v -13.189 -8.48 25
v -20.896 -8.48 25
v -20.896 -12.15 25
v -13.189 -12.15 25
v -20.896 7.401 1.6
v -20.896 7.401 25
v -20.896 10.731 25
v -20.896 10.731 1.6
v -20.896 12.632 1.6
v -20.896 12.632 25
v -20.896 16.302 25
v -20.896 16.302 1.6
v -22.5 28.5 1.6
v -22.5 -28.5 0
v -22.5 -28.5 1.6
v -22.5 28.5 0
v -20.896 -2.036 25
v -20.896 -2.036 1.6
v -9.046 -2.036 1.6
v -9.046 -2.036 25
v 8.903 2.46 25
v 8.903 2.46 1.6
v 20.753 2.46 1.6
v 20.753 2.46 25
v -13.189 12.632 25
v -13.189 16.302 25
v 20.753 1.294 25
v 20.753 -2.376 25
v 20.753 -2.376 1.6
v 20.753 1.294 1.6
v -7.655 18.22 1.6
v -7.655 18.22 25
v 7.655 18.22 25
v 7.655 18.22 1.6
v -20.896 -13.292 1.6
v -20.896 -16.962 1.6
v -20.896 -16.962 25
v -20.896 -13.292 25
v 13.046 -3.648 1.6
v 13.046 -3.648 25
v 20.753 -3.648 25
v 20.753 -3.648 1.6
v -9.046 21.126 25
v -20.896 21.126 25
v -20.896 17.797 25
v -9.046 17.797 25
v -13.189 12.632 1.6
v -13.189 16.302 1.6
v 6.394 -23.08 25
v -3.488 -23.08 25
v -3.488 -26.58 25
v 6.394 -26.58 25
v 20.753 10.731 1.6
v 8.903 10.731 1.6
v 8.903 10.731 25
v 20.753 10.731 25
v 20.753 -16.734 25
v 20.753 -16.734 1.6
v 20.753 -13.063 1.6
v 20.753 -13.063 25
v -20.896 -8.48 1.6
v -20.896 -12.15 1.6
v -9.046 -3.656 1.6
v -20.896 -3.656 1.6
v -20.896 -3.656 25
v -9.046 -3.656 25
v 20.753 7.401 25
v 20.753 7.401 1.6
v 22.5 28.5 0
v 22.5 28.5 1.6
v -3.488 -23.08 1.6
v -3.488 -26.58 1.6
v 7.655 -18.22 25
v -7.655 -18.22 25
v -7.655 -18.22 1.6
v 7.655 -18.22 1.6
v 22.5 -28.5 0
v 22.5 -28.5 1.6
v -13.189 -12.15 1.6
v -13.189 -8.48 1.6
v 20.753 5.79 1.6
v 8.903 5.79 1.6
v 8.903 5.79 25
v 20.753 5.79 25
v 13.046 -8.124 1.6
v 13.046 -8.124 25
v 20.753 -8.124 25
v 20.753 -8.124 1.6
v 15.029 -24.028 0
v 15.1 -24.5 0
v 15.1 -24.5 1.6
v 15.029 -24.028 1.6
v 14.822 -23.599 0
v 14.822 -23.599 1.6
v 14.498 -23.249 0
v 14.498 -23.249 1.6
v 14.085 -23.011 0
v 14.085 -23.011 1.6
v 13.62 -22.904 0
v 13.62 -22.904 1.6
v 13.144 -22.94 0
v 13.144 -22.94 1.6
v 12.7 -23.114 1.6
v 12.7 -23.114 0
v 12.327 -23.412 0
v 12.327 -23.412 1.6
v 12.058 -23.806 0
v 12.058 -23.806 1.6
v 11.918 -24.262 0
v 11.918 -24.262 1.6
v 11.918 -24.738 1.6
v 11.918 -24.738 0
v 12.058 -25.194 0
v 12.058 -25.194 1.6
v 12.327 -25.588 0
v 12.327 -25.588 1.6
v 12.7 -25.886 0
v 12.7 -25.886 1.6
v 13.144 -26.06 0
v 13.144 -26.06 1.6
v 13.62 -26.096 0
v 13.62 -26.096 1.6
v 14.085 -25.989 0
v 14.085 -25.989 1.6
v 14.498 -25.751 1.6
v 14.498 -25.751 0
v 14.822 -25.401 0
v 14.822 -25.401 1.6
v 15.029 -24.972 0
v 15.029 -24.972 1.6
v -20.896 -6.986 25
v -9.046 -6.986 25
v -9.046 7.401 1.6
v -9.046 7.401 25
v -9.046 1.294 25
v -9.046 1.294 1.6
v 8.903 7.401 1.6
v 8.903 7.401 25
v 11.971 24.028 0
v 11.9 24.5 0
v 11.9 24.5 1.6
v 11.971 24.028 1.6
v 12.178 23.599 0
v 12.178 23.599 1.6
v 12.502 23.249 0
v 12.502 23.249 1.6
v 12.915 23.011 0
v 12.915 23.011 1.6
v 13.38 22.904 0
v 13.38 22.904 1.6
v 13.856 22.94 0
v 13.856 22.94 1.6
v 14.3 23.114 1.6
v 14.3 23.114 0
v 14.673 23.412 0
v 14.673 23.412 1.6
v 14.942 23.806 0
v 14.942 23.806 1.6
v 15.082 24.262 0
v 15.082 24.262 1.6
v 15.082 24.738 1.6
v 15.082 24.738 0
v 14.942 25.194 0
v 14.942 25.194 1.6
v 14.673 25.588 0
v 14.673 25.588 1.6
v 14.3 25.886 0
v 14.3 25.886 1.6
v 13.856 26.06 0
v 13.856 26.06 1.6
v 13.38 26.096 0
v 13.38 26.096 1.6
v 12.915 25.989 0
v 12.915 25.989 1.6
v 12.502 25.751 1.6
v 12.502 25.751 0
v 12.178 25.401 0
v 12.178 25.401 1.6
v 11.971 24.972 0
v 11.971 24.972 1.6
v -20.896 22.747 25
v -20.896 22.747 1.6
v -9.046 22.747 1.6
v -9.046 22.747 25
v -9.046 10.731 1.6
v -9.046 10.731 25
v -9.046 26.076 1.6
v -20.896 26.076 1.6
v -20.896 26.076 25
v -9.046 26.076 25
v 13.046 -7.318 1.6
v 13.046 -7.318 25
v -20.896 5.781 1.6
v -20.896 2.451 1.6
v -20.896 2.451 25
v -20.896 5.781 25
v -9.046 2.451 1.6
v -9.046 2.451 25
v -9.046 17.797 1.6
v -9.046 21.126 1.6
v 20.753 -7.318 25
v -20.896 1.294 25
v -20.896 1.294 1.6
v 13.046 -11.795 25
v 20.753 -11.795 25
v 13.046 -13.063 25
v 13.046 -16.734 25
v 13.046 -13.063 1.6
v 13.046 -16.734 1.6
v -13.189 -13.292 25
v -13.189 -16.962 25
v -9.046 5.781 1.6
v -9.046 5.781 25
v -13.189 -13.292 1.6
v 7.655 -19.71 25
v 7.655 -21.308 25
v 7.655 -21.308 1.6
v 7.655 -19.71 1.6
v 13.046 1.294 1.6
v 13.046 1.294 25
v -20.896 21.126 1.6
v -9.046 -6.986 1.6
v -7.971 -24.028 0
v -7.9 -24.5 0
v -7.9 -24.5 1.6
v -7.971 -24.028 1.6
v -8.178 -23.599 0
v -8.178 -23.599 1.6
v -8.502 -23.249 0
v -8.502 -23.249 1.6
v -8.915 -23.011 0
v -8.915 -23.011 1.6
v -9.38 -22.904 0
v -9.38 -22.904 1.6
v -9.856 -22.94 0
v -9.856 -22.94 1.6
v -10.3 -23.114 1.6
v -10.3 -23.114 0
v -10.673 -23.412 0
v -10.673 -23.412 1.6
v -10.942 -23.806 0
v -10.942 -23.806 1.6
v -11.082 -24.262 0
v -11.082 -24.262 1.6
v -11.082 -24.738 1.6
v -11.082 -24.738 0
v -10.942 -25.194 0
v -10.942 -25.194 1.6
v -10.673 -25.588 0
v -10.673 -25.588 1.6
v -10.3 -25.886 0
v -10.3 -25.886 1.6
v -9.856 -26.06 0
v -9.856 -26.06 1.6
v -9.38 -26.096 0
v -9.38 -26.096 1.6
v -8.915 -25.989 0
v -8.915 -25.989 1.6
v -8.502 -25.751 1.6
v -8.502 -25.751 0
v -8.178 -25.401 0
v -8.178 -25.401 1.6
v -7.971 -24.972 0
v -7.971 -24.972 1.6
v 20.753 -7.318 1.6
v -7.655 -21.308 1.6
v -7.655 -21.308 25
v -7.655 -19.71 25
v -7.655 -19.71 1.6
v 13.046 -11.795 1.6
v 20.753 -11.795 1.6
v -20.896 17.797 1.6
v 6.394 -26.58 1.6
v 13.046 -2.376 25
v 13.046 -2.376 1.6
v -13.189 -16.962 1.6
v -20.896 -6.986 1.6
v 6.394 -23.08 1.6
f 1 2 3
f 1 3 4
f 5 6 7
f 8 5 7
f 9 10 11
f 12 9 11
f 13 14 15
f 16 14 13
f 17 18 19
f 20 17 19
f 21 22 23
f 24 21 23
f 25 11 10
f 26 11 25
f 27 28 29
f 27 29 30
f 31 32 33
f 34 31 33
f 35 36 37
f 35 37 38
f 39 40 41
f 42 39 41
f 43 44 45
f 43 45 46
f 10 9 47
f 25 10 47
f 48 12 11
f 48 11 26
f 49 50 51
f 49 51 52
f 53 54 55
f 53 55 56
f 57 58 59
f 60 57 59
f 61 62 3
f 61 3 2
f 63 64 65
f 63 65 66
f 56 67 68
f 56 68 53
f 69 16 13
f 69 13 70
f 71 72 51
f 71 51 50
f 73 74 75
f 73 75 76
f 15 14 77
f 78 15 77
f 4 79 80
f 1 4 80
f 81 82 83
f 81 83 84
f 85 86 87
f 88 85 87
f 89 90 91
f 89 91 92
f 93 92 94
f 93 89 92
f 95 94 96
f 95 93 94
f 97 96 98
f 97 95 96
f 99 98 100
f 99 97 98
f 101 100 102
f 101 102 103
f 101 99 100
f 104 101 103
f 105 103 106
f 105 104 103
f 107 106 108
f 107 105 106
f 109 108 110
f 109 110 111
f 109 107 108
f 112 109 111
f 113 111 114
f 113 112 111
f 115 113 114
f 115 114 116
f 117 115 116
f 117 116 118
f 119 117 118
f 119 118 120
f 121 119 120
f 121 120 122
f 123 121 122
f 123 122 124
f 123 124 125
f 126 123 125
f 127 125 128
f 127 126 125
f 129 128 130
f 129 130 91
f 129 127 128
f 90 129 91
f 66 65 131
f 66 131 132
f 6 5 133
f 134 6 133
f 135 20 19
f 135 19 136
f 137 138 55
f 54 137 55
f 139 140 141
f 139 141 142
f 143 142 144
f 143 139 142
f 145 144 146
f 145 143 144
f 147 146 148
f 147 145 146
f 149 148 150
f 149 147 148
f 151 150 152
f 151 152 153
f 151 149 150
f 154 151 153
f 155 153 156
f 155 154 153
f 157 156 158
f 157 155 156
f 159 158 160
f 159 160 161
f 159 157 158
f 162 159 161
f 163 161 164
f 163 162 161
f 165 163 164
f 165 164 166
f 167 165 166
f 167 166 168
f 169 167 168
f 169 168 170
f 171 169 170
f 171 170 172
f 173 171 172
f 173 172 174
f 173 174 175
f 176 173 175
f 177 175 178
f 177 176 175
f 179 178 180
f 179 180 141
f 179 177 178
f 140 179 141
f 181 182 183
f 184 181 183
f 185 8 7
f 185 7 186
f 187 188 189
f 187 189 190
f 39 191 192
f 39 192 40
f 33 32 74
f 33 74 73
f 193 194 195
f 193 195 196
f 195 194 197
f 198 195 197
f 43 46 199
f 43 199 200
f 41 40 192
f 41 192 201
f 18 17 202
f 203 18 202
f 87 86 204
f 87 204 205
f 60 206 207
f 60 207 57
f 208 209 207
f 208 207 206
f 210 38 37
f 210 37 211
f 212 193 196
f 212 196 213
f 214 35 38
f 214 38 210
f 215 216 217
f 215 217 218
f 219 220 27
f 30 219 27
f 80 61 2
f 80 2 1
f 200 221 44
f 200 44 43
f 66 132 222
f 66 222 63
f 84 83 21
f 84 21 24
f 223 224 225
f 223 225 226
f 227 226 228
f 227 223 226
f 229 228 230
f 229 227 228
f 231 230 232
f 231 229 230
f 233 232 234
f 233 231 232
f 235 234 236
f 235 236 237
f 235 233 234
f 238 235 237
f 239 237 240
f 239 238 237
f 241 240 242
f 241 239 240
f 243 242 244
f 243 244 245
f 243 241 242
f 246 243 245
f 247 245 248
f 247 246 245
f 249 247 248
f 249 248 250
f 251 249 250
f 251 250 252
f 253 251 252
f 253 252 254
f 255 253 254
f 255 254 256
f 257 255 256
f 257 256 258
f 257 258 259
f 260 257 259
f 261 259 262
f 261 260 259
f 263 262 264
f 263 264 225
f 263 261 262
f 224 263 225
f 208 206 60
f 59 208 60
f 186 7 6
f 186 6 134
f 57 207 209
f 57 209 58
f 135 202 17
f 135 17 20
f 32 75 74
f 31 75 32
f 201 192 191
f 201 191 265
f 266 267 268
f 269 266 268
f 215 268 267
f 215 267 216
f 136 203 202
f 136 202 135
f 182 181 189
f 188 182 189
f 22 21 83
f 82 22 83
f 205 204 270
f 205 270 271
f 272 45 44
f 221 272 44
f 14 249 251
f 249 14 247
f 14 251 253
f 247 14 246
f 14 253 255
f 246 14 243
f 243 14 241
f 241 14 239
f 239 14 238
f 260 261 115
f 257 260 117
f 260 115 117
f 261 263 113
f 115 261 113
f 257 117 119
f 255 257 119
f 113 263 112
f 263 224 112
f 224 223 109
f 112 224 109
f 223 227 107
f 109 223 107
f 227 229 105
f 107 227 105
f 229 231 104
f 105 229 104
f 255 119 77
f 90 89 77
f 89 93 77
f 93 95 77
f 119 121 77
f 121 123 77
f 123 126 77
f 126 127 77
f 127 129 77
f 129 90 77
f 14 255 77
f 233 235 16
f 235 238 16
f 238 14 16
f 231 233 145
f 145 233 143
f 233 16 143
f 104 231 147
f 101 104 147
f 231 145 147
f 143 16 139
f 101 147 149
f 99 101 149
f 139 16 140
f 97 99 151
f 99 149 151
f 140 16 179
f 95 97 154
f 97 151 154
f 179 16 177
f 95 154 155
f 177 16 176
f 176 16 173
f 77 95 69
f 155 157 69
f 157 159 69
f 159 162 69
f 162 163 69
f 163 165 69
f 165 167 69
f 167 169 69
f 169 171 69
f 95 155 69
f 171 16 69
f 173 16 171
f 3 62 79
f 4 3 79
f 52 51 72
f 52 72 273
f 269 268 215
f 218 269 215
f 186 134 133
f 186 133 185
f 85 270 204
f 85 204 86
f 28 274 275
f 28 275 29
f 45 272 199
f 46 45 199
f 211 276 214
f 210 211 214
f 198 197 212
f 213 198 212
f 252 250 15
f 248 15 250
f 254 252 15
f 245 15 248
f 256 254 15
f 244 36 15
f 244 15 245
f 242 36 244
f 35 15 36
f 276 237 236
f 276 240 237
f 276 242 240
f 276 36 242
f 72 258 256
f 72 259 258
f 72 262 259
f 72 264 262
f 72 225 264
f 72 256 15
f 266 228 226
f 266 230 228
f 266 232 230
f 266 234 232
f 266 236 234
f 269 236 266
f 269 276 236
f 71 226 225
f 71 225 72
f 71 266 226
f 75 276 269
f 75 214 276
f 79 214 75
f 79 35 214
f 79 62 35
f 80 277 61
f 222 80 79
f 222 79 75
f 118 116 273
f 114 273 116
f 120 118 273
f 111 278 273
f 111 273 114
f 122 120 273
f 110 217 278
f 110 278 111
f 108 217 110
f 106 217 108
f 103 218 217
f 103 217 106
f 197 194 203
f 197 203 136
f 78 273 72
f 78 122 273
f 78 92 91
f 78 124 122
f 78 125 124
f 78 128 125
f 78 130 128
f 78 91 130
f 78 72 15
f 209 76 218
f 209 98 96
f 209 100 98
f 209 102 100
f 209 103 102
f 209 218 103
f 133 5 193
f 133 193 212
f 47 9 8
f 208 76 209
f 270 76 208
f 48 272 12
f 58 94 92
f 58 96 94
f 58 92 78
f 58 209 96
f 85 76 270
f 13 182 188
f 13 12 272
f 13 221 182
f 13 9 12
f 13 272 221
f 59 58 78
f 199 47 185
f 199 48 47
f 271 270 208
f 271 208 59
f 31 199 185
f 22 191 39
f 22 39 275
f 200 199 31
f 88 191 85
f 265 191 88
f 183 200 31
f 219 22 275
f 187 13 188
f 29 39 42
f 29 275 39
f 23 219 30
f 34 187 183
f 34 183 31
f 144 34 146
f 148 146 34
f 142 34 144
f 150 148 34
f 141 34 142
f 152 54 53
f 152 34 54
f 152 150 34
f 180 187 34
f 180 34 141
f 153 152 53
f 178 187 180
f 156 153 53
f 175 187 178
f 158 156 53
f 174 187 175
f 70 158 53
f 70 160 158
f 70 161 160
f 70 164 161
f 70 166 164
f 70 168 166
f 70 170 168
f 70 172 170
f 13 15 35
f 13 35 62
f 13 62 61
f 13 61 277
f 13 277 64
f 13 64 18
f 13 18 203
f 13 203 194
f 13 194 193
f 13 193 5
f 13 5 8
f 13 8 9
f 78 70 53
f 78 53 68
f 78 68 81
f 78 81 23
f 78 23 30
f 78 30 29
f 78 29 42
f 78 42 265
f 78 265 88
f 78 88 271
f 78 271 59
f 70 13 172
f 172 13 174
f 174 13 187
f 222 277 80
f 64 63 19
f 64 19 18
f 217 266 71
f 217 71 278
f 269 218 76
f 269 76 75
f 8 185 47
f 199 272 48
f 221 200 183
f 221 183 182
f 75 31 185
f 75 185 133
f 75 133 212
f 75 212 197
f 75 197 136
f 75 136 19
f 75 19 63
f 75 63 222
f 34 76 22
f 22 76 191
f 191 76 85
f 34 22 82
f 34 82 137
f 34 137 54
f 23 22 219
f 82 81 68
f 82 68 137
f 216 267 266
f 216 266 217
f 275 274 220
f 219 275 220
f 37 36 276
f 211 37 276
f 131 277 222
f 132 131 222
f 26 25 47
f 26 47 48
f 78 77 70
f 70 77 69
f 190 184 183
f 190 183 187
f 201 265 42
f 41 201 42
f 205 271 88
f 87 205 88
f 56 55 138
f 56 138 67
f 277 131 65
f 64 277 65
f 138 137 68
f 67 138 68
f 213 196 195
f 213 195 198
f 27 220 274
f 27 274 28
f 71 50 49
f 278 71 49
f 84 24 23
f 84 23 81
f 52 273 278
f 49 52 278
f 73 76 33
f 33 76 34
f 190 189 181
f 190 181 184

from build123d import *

# Parameters (mm, degrees)
ESQUISSE1_W        = 45
ESQUISSE1_H        = 57
ESQUISSE1_R        = 1.6
BOSS_EXTRU_1_DEPTH = 1.6
ESQUISSE2_W        = 11.850194894
ESQUISSE2_H        = 3.329778143
ESQUISSE2_W_2      = 15.310163146
ESQUISSE2_H_2      = 36.439531762
ESQUISSE2_H_3      = 1.59771523
ESQUISSE2_W_3      = 9.88221832
ESQUISSE2_H_4      = 3.500525205
ESQUISSE2_W_4      = 7.70708484
ESQUISSE2_H_5      = 3.6703264
ESQUISSE2_H_6      = 3.670326401
ESQUISSE2_W_5      = 11.850194895
BOSS_EXTRU_2_DEPTH = 23.4


with BuildPart() as part:
    # Esquisse1 → Boss.-Extru.1 (new body)
    with BuildSketch(Plane.XY):
        Rectangle(ESQUISSE1_W, ESQUISSE1_H)
        with Locations(Location((13.5, 24.5, 0), (0, 0, 180))):
            Circle(ESQUISSE1_R, mode=Mode.SUBTRACT)
        with Locations((13.5, -24.5)):
            Circle(ESQUISSE1_R, mode=Mode.SUBTRACT)
        with Locations((-9.5, -24.5)):
            Circle(ESQUISSE1_R, mode=Mode.SUBTRACT)
    extrude(amount=BOSS_EXTRU_1_DEPTH)

    # Esquisse2 → Boss.-Extru.2 (add)
    with BuildSketch(Plane.XY.offset(1.6)):
        with Locations((14.82837193, 4.125238088)):
            Rectangle(ESQUISSE2_W, ESQUISSE2_H)
        Rectangle(ESQUISSE2_W_2, ESQUISSE2_H_2)
        with Locations((0, -20.508898976)):
            Rectangle(ESQUISSE2_W_2, ESQUISSE2_H_3)
        with Locations((14.82837193, 9.066341161)):
            Rectangle(ESQUISSE2_W, ESQUISSE2_H)
        with Locations((1.45328533, -24.82991901)):
            Rectangle(ESQUISSE2_W_3, ESQUISSE2_H_4)
        with Locations((16.899926957, -0.541039394)):
            Rectangle(ESQUISSE2_W_4, ESQUISSE2_H_5)
        with Locations((16.899926957, -5.483268114)):
            Rectangle(ESQUISSE2_W_4, ESQUISSE2_H_5)
        with Locations((16.899926957, -9.959457009)):
            Rectangle(ESQUISSE2_W_4, ESQUISSE2_H_5)
        with Locations((16.899926957, -14.89838332)):
            Rectangle(ESQUISSE2_W_4, ESQUISSE2_H_6)
        with Locations((-14.971381513, 24.411505641)):
            Rectangle(ESQUISSE2_W_5, ESQUISSE2_H)
        with Locations((-17.042936541, 14.467204765)):
            Rectangle(ESQUISSE2_W_4, ESQUISSE2_H_5)
        with Locations((-14.971381513, 19.461546453)):
            Rectangle(ESQUISSE2_W_5, ESQUISSE2_H)
        with Locations((-14.971381513, 9.066341161)):
            Rectangle(ESQUISSE2_W_5, ESQUISSE2_H)
        with Locations((-14.971381513, 4.116381974)):
            Rectangle(ESQUISSE2_W_5, ESQUISSE2_H)
        with Locations((-14.971381513, -0.370765265)):
            Rectangle(ESQUISSE2_W_5, ESQUISSE2_H)
        with Locations((-14.971381513, -5.320724453)):
            Rectangle(ESQUISSE2_W_5, ESQUISSE2_H)
        with Locations((-17.042936541, -10.31506614)):
            Rectangle(ESQUISSE2_W_4, ESQUISSE2_H_5)
        with Locations((-17.042936541, -15.126670853)):
            Rectangle(ESQUISSE2_W_4, ESQUISSE2_H_5)
    extrude(amount=BOSS_EXTRU_2_DEPTH)


solid = part.part
